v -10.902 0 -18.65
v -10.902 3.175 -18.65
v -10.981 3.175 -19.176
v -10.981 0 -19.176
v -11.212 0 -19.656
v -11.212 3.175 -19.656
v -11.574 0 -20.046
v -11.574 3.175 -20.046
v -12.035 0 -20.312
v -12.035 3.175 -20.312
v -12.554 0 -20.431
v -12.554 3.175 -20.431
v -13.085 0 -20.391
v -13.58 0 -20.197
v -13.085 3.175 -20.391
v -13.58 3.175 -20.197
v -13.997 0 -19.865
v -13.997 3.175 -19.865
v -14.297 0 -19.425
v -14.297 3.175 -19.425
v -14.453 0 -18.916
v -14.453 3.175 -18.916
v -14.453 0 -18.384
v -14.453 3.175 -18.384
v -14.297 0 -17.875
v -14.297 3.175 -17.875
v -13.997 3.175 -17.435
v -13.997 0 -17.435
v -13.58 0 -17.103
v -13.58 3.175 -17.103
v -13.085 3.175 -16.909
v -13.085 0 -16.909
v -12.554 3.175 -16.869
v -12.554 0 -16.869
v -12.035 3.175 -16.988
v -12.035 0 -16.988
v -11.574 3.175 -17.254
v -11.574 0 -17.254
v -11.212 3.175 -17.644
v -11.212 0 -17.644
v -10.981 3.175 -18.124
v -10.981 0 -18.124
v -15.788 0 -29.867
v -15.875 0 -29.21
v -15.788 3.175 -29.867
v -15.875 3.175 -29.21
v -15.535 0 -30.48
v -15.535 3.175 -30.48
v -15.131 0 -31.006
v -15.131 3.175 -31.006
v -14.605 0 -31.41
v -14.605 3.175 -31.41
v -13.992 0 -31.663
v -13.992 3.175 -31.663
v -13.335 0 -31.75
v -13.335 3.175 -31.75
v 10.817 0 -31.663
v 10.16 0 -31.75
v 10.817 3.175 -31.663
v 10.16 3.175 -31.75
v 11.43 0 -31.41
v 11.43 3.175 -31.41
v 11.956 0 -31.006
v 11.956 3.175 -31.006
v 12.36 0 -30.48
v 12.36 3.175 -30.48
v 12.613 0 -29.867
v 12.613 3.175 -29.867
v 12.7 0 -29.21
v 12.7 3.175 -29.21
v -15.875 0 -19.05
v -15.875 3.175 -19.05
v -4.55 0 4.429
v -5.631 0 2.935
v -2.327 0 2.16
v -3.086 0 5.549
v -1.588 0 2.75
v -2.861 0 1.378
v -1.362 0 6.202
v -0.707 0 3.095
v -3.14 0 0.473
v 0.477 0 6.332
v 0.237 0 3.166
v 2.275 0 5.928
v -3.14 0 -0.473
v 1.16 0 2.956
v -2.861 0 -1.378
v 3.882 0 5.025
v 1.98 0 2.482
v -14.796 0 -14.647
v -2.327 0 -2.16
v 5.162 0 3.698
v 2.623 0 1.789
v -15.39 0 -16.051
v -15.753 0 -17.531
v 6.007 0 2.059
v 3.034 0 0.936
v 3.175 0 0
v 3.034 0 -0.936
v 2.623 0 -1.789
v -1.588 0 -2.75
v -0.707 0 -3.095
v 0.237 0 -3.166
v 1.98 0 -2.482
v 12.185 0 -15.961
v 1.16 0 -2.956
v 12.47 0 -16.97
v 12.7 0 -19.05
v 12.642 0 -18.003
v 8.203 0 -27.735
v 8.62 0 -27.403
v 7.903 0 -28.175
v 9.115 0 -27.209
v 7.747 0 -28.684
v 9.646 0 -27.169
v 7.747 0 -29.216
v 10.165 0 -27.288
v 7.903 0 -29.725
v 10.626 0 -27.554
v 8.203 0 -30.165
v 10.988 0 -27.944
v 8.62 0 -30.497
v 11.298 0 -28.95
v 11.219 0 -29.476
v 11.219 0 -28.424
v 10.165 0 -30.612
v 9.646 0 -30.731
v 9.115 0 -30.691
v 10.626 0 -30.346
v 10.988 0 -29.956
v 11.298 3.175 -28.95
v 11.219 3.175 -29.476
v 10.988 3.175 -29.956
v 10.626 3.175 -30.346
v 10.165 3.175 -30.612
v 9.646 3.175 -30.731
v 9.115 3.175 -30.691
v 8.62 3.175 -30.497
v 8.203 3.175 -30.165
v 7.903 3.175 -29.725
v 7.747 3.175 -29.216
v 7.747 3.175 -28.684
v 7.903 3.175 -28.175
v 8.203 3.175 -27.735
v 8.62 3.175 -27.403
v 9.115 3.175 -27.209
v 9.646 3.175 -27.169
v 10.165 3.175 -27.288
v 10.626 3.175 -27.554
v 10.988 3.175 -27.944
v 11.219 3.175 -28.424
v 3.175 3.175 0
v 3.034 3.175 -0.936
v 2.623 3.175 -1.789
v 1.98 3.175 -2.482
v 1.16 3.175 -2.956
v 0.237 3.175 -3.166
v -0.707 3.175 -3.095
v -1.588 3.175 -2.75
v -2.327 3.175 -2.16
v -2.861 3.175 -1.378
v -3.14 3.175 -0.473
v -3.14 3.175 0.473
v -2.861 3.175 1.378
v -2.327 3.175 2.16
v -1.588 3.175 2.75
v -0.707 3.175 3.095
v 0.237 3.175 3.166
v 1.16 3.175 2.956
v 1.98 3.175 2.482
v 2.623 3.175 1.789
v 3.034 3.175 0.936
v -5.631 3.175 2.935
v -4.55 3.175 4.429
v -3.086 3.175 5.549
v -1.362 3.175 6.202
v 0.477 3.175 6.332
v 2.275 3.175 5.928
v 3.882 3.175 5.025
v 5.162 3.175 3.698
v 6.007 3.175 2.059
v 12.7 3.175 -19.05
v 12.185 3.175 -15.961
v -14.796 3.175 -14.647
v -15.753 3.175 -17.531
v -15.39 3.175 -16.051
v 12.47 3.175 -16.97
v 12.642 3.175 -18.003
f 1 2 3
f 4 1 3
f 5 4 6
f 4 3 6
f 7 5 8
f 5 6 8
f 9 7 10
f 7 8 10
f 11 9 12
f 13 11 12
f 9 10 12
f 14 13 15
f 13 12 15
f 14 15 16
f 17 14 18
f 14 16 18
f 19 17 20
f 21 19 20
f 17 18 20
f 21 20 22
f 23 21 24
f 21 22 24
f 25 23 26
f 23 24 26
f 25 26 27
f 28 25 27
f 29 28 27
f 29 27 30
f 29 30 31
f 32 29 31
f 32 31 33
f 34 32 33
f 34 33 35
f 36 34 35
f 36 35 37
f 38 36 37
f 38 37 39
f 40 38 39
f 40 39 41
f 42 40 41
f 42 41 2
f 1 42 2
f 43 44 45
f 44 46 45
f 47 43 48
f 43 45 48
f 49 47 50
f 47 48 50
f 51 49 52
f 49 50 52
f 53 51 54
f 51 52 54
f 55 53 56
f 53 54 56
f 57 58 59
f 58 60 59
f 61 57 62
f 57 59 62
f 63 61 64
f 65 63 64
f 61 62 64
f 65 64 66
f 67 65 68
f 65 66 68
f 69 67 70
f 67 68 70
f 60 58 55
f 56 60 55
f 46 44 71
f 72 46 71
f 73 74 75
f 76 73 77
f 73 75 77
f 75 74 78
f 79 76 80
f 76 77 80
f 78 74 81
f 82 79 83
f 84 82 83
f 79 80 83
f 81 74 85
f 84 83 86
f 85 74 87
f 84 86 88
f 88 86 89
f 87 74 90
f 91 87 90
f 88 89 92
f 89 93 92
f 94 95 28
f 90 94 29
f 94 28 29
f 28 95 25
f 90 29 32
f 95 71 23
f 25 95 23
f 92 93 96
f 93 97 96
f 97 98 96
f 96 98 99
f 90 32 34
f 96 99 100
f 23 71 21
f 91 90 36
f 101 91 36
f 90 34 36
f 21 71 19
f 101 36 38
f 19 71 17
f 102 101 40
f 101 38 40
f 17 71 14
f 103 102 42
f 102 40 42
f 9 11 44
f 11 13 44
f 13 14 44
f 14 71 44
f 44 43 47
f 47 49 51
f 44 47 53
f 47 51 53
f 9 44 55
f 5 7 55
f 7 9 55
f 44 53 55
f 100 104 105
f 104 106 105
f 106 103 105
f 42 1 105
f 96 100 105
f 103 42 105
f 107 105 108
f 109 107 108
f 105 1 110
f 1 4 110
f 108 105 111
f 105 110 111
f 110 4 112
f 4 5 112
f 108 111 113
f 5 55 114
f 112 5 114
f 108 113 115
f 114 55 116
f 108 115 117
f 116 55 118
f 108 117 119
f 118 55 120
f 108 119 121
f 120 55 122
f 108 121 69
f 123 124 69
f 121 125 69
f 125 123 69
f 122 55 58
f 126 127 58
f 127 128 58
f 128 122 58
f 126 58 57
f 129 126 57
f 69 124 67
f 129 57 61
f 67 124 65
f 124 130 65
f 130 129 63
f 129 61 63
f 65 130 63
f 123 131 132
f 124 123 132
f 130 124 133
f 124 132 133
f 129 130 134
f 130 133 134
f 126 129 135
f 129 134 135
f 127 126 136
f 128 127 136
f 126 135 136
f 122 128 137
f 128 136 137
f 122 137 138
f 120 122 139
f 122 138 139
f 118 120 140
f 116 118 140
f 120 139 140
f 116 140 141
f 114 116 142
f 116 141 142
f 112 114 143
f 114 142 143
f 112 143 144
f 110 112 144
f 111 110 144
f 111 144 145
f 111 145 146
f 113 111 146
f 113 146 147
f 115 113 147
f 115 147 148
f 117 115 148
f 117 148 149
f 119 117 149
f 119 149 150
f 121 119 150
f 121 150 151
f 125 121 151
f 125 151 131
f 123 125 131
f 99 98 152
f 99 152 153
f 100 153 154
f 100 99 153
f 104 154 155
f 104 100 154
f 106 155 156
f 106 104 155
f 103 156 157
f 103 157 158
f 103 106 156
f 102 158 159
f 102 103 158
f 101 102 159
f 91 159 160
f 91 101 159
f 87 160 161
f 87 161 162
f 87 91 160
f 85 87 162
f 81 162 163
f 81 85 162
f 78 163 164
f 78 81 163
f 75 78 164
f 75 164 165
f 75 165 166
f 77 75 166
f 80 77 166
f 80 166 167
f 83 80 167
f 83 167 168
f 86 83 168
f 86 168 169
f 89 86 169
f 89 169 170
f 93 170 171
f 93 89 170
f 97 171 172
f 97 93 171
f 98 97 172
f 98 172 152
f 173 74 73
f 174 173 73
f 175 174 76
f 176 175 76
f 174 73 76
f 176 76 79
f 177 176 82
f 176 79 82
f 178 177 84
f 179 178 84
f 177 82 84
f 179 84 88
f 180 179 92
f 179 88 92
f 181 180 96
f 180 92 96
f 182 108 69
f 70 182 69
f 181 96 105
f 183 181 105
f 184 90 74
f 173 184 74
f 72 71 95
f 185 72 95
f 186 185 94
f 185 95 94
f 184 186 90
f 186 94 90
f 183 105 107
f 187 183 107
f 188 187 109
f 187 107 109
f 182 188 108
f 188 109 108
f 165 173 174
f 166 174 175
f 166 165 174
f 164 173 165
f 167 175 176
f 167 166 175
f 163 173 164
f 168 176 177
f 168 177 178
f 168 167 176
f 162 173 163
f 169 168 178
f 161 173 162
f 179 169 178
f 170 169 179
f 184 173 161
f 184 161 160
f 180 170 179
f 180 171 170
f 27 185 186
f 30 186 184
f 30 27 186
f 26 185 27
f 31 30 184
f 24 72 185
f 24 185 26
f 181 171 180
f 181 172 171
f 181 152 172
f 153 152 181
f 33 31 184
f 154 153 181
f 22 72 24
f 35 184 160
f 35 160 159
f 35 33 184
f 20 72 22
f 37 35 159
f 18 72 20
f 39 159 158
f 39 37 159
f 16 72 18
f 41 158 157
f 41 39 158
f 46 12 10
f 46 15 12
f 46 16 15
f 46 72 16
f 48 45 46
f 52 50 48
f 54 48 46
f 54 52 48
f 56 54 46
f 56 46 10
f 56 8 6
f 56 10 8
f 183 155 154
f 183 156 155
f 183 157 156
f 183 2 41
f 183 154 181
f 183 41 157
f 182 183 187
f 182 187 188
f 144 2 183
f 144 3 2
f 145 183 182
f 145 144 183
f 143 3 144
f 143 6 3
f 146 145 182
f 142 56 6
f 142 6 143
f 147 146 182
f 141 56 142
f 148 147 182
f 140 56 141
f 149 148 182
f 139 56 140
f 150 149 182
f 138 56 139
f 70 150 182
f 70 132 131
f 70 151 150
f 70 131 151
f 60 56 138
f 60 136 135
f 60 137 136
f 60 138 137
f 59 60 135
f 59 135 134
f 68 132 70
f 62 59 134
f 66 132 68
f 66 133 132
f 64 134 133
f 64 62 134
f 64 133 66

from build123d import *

# Parameters (mm, degrees)
SKETCH1_R           = 3.175
BOSS_EXTRUDE1_DEPTH = 3.175
SKETCH2_R           = 1.7859375
CUT_EXTRUDE1_DEPTH  = 4.175
FILLET1_R           = 2.54


with BuildPart() as part:
    # Sketch1 → Boss-Extrude1 (new body)
    with BuildSketch(Plane(origin=(0, 0, 0), x_dir=(1, 0, 0), z_dir=(0, 1, 0))):
        with BuildLine():
            Line((-14.79629089, 14.647069703), (-5.630860593, -2.935286864))
            ThreePointArc((-5.630860593, -2.935286864), (0.476542645, -6.332093422), (6.006756757, -2.059459459))
            Line((6.006756757, -2.059459459), (12.185135135, 15.960810811))
            ThreePointArc((12.185135135, 15.960810811), (12.570402125, 17.484099646), (12.7, 19.05))
            Line((12.7, 19.05), (12.7, 31.75))
            Line((12.7, 31.75), (-15.875, 31.75))
            Line((-15.875, 31.75), (-15.875, 19.05))
            ThreePointArc((-15.875, 19.05), (-15.601393023, 16.783427227), (-14.79629089, 14.647069703))
        make_face()
        Circle(SKETCH1_R, mode=Mode.SUBTRACT)
    extrude(amount=BOSS_EXTRUDE1_DEPTH)

    # Sketch2 → Cut-Extrude1 (cut, through all)
    with BuildSketch(Plane(origin=(0, 3.175, 0), x_dir=(1, 0, 0), z_dir=(0, 1, 0))):
        with Locations((-12.6875, 18.65)):
            Circle(SKETCH2_R)
        with Locations((9.5125, 28.95)):
            Circle(SKETCH2_R)
    extrude(amount=-CUT_EXTRUDE1_DEPTH, mode=Mode.SUBTRACT)

    # Fillet1
    fillet1_edges = [part.edges().sort_by_distance(p)[0] for p in [
        (-15.875, 1.5875, -31.75),
        (12.7, 1.5875, -31.75),
    ]]
    fillet(fillet1_edges, radius=FILLET1_R)


solid = part.part
